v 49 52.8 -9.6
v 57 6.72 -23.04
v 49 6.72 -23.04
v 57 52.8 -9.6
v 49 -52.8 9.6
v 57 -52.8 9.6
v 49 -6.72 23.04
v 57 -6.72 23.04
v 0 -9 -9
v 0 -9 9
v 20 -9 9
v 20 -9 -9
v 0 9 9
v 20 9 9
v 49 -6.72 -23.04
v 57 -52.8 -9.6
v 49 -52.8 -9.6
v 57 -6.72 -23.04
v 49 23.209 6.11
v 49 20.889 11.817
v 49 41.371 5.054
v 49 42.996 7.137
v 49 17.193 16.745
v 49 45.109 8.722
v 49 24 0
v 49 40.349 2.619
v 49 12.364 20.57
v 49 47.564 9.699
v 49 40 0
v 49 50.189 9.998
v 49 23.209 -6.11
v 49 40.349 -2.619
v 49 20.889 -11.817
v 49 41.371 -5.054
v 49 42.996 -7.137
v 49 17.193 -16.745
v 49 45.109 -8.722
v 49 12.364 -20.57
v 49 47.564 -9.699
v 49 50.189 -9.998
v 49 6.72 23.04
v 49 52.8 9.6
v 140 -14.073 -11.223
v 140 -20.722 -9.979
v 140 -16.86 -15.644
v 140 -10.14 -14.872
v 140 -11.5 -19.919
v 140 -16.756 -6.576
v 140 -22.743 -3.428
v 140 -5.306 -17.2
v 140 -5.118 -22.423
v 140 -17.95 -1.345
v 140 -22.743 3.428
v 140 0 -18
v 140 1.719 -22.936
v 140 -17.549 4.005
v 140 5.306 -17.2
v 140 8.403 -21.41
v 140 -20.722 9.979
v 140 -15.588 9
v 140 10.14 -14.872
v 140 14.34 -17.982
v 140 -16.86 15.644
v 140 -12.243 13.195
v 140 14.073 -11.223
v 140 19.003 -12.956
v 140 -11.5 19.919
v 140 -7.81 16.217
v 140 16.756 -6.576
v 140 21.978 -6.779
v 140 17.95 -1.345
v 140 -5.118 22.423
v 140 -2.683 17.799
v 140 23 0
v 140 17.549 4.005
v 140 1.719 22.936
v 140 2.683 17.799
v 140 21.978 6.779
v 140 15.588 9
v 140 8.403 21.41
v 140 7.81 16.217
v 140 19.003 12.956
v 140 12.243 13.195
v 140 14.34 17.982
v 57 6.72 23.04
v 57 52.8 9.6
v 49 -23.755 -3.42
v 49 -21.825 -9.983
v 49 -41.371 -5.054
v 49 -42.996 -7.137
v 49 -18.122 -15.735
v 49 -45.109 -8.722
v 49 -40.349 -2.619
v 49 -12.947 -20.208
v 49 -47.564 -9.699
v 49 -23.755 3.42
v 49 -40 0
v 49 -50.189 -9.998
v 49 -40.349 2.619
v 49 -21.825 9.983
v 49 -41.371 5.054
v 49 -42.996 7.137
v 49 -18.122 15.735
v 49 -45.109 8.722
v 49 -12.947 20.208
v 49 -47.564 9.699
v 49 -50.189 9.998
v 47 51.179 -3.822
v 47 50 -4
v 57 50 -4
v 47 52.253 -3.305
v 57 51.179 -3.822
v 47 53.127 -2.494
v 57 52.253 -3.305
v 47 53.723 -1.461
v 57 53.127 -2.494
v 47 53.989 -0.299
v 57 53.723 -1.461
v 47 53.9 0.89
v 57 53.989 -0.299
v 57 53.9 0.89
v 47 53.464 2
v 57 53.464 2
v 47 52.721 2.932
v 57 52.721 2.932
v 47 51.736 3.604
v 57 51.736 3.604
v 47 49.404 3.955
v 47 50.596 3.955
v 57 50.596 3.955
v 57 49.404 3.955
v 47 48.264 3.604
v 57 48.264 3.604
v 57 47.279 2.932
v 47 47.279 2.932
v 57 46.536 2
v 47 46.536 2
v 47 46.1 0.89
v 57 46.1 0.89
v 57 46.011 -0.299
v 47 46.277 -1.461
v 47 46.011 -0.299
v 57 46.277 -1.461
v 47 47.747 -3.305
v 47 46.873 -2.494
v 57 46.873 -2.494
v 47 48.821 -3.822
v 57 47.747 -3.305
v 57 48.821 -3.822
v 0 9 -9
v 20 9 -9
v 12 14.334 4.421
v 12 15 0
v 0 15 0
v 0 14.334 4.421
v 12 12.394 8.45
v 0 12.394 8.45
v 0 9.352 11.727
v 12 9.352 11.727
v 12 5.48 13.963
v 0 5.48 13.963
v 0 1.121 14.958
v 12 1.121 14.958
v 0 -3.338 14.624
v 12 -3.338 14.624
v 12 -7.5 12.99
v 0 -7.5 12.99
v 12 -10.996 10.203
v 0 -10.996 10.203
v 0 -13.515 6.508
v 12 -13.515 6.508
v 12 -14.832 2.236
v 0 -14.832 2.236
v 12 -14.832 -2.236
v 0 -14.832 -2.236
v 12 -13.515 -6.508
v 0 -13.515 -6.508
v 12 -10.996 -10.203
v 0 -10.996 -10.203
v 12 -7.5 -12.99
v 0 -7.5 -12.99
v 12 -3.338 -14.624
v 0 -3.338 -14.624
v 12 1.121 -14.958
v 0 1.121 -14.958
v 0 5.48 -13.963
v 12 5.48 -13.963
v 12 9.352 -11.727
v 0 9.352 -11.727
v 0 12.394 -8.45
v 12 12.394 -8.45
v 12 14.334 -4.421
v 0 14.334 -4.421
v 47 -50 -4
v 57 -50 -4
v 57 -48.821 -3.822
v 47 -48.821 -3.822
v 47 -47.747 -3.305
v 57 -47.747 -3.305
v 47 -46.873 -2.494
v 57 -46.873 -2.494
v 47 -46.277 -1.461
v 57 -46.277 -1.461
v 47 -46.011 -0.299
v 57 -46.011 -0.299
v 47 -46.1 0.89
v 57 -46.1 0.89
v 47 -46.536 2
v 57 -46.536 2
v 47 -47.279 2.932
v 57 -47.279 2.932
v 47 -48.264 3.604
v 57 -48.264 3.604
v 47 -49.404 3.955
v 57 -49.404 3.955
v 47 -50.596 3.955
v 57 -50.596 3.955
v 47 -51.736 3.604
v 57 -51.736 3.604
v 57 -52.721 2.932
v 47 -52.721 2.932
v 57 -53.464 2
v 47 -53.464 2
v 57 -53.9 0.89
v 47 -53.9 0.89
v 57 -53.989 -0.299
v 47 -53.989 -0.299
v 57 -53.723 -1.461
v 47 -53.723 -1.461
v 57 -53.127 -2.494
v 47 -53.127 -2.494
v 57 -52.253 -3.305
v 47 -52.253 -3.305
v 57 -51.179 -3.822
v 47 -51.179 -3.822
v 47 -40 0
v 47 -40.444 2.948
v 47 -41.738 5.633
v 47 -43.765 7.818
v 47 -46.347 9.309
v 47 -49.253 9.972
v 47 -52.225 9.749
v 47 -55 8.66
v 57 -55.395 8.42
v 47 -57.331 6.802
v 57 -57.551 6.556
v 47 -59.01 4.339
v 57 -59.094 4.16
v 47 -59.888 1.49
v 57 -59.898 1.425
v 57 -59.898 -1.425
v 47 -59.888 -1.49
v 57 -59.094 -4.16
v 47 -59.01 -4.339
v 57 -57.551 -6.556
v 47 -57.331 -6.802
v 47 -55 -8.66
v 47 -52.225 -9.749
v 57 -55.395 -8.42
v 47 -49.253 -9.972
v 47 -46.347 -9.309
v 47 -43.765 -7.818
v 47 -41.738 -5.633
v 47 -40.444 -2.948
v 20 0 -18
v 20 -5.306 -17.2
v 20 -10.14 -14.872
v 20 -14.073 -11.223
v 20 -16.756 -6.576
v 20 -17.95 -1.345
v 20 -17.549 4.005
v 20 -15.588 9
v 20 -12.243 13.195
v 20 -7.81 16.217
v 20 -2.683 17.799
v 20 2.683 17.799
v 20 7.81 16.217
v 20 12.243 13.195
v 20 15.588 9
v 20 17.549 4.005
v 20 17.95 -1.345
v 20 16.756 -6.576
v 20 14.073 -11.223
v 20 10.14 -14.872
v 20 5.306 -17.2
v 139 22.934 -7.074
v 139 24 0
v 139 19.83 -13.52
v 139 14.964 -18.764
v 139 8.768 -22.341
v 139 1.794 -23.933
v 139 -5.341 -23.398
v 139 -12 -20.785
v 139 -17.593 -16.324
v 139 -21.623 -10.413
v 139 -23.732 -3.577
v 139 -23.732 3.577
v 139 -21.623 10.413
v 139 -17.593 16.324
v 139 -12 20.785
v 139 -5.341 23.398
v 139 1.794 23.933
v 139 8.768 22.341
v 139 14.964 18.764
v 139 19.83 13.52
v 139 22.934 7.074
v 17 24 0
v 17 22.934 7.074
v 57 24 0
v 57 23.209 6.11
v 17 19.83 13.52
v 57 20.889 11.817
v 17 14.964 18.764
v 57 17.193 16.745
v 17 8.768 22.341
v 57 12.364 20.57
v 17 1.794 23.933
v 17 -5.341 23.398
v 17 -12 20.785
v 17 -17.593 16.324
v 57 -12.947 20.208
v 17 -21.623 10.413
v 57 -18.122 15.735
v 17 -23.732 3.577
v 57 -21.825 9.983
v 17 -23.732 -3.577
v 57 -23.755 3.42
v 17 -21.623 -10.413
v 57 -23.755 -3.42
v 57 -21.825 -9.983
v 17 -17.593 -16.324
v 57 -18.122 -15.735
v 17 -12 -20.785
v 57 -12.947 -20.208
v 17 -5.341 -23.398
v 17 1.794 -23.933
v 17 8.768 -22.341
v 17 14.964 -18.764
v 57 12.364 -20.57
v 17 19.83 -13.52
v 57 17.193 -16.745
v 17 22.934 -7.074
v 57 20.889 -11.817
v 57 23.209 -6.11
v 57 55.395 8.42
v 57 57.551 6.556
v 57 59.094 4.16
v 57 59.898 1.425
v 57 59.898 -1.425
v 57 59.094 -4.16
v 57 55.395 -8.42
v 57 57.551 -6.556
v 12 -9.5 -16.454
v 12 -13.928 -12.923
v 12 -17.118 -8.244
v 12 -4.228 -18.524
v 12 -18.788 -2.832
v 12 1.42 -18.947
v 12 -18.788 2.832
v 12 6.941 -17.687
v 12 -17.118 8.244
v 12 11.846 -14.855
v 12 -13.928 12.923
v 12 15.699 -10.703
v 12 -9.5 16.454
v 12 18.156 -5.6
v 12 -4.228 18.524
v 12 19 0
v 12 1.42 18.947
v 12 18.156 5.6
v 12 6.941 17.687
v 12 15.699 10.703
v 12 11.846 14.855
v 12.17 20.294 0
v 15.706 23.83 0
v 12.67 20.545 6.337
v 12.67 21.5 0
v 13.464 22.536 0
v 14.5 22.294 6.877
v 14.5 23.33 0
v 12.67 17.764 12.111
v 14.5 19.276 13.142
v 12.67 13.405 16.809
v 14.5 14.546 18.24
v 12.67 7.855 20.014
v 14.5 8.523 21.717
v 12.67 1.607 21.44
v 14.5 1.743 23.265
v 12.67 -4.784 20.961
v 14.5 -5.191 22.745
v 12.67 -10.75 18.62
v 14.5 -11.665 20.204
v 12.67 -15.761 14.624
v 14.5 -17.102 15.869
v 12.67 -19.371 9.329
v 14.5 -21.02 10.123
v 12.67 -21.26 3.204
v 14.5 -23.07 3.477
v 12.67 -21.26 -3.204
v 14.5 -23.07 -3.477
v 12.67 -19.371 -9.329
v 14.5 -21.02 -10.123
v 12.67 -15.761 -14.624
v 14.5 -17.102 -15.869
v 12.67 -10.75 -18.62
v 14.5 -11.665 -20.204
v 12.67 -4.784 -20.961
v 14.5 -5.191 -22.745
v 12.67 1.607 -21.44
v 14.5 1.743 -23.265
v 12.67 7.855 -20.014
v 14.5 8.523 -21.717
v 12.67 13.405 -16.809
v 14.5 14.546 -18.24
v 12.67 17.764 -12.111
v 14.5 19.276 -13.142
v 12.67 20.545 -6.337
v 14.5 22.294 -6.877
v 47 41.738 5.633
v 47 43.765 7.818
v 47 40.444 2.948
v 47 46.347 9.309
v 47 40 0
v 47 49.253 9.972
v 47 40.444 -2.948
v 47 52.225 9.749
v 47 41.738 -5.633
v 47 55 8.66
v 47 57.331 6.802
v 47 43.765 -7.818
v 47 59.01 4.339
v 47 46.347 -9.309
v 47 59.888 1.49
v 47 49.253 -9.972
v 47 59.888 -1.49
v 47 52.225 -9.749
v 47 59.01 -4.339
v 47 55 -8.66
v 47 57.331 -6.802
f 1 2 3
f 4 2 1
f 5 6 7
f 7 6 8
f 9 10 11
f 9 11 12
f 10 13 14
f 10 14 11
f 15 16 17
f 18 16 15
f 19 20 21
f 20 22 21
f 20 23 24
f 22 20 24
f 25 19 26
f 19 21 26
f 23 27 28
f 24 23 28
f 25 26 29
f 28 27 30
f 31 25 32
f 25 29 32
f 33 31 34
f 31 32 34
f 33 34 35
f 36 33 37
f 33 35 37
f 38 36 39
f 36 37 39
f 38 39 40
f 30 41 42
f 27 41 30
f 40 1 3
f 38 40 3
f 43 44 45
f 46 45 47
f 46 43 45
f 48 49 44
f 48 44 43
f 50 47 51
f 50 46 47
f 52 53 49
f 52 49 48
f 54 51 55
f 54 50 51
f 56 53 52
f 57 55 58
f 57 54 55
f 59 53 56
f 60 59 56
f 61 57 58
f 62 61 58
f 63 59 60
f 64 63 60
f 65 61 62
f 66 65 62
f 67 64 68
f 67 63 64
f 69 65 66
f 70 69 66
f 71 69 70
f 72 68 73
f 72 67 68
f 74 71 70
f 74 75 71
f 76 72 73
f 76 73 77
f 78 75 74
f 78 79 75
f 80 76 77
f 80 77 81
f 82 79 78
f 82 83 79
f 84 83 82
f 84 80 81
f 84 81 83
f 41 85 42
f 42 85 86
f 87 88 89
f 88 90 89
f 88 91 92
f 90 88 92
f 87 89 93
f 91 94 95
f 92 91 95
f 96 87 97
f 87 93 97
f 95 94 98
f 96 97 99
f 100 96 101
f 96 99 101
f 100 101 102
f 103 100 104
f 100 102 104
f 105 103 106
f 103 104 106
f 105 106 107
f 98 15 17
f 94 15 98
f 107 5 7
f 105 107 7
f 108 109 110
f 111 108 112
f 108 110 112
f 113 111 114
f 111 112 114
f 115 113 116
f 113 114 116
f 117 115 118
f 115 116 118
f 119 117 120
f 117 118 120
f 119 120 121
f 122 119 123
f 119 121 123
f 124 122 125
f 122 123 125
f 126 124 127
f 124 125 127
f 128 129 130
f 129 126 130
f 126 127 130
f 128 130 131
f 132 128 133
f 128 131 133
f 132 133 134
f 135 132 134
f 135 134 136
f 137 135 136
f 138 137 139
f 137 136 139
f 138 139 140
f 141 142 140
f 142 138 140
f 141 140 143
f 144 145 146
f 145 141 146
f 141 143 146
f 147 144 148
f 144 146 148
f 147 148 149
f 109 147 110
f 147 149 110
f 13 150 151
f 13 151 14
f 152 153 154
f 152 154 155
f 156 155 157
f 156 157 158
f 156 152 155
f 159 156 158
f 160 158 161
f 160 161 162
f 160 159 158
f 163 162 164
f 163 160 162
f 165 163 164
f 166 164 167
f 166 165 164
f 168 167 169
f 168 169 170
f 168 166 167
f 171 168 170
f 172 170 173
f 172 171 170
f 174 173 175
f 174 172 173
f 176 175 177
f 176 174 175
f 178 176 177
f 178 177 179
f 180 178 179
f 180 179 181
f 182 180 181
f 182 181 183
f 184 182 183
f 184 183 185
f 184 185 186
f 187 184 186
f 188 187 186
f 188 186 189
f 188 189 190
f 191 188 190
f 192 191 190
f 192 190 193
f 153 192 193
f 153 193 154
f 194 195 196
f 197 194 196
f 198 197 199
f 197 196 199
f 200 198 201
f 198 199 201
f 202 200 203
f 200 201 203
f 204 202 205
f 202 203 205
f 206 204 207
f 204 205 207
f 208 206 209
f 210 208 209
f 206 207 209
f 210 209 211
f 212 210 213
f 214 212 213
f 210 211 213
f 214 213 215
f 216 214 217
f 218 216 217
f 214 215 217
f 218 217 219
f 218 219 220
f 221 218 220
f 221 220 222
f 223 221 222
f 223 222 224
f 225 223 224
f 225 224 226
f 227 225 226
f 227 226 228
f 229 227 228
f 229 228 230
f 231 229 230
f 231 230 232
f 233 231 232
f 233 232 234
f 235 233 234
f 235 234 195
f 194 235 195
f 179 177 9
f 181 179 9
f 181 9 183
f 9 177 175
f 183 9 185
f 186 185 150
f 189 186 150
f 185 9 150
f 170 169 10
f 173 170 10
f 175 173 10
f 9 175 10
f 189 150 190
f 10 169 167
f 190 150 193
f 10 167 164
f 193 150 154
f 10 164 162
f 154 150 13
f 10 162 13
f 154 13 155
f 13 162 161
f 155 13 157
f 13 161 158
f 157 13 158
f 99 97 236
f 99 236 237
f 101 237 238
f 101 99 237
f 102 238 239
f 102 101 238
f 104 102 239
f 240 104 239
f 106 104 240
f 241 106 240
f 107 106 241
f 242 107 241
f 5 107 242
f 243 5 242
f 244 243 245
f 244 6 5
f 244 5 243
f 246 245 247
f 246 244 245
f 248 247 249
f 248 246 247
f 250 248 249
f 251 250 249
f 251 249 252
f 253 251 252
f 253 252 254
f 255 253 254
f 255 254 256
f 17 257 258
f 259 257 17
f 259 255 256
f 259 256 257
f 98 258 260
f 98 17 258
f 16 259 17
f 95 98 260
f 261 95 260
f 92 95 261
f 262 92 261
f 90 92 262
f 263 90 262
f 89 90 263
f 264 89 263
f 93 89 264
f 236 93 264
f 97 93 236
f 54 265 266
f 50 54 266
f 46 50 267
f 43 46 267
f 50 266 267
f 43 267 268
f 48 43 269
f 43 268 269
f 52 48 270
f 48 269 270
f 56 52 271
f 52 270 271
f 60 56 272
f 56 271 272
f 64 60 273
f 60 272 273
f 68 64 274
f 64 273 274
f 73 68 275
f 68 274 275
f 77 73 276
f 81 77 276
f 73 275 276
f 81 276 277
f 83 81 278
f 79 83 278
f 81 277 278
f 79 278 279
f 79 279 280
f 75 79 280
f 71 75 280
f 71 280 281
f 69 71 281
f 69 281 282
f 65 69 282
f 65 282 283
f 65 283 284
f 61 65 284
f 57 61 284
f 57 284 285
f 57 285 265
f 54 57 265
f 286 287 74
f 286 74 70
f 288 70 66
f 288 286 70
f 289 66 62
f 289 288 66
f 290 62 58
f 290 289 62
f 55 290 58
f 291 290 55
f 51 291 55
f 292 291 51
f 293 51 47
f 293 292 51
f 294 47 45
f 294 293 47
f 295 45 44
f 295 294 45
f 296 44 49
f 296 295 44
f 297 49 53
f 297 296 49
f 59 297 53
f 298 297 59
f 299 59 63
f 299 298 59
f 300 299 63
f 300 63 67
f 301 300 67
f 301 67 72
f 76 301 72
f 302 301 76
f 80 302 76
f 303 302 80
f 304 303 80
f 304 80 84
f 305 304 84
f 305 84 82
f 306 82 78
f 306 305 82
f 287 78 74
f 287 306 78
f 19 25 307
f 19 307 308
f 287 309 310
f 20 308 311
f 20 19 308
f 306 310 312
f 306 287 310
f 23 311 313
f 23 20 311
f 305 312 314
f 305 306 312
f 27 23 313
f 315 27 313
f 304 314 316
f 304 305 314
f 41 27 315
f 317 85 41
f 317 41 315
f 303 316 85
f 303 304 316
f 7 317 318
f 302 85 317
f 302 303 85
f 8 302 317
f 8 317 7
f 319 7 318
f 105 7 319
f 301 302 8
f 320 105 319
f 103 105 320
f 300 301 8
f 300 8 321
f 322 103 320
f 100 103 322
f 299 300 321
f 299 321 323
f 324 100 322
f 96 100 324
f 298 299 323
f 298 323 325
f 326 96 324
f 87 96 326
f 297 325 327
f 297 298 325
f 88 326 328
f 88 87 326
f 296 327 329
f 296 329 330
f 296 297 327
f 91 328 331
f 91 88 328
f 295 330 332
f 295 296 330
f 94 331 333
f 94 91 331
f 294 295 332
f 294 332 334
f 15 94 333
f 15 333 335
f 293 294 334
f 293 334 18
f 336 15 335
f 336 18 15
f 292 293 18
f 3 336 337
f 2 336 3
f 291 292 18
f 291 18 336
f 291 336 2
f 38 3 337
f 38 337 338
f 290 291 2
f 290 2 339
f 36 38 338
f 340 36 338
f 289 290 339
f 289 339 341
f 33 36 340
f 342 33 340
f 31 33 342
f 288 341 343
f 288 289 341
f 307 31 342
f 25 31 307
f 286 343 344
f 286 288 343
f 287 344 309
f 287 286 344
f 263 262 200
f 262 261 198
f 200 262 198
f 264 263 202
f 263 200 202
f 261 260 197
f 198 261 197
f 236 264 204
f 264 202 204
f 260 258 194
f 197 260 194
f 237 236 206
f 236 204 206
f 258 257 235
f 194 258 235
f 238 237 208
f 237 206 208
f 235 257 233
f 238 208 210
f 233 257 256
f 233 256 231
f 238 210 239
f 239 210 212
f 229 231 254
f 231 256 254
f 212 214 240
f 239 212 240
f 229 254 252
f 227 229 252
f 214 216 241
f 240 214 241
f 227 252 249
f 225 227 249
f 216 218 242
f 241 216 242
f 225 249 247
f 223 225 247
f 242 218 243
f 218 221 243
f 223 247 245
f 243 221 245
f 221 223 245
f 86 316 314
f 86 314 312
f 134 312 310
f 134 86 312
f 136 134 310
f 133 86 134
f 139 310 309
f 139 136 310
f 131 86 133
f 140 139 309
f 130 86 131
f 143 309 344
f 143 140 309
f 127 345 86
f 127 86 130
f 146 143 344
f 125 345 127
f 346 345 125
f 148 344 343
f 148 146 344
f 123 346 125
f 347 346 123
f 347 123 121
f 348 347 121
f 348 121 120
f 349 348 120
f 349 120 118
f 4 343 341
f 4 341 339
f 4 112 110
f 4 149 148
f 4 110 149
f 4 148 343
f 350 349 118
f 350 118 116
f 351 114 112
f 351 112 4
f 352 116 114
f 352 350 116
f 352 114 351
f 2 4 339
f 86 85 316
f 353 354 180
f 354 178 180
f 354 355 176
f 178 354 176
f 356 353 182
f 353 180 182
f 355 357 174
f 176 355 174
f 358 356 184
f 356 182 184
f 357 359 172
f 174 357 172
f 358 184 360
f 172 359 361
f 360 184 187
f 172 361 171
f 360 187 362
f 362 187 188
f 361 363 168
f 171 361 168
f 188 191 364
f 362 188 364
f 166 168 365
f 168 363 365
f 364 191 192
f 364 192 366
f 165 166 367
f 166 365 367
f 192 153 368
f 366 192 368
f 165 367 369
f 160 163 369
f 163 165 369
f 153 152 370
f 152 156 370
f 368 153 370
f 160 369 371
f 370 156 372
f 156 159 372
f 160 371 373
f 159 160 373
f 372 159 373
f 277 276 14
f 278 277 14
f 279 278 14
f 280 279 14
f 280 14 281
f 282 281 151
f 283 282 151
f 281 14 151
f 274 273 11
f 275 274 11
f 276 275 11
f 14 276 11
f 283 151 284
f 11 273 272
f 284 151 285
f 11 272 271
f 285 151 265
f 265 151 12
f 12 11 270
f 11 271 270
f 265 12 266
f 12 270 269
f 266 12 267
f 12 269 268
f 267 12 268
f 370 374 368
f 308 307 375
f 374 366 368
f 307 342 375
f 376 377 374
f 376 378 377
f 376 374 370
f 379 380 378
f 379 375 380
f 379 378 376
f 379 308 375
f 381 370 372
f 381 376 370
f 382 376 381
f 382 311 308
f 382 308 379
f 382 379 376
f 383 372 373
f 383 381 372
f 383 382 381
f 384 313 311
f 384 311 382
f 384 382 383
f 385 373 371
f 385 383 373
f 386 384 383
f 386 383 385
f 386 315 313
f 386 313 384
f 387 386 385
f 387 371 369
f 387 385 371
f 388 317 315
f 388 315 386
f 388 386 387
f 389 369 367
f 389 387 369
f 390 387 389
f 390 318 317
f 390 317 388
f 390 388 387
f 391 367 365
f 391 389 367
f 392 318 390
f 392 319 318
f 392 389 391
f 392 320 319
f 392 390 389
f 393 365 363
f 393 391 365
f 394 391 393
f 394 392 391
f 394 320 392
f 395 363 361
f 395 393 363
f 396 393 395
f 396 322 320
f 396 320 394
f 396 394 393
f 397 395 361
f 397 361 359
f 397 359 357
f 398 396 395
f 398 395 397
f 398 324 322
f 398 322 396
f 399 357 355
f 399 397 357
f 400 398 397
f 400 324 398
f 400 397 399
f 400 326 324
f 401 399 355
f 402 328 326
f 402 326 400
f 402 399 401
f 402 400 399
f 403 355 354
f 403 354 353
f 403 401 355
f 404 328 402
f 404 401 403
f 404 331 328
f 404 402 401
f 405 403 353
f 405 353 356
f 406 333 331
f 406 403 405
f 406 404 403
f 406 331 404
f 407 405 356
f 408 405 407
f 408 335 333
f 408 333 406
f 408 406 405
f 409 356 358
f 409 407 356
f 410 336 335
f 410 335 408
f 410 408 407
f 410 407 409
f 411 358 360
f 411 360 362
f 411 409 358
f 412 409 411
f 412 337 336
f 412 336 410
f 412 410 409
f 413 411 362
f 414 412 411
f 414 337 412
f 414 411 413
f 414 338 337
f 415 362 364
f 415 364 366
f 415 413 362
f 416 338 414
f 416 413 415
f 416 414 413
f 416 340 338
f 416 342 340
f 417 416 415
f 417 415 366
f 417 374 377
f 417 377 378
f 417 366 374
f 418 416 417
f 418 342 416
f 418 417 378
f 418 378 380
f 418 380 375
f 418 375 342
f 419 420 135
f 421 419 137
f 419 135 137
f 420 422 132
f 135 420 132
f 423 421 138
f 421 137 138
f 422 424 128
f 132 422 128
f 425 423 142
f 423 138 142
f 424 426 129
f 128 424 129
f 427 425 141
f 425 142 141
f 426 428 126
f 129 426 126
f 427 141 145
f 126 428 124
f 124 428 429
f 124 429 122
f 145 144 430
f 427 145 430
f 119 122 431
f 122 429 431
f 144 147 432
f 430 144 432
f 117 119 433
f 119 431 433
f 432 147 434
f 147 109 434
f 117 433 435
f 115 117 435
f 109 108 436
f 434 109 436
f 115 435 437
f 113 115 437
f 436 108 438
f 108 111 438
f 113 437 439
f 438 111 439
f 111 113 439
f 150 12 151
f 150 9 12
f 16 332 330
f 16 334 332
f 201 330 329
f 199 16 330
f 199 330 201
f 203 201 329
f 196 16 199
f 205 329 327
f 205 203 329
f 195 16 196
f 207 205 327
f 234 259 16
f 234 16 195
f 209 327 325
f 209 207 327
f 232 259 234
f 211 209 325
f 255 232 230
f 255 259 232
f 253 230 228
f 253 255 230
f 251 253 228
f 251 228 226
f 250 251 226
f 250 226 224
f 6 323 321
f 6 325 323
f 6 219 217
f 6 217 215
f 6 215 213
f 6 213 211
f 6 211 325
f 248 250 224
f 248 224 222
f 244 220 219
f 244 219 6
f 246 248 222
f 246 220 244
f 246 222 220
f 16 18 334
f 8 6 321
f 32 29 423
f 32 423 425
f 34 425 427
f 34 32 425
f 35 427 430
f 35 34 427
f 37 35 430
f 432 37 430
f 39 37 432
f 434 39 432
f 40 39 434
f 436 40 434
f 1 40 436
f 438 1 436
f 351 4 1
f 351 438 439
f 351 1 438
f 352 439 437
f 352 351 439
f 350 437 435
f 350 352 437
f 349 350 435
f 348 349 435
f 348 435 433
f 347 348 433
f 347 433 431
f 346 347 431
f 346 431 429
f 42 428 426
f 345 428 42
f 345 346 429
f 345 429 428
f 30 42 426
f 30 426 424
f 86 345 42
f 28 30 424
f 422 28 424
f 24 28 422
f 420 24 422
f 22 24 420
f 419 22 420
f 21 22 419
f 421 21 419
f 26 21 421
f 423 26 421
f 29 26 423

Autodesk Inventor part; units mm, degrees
ref_plane "YZ Plane" through (0, 0, 0) normal (1, 0, 0) x (0, 1, 0)
ref_plane "XZ Plane" through (0, 0, 0) normal (0, 1, 0) x (-1, 0, 0)
sketch "Эскиз1" plane through (0, 0, 0) normal (0, 0, 1) x (1, 0, 0)
  line L0 (0, 0) -> (140, 0)
  line L1 (0, 0) -> (0, 15)
  line L2 (0, 15) -> (12, 15)
  line L3 (12, 15) -> (12, 24)
  line L4 (12, 24) -> (140, 24)
  line L5 (140, 24) -> (140, 0)
  dimension "d1" = 30
  dimension "d2" = 48
  dimension "d3" = 12
  dimension "d4" = 140
revolve "Вращение1" add sketch "Эскиз1" angle 360 about axis through (0, 0, 0) along (1, 0, 0)
ref_plane "РабПлоскость1" through (57, 0, 0) normal (1, 0, 0) x (0, 0, -1)
sketch "Эскиз2" plane through (57, 0, 0) normal (1, 0, 0) x (0, 0, -1)
  arc A0 (0, 40) -> (9.6, 52.8) centre (0, 50) ccw
  circle A1 centre (0, 0) radius 24 projected
  line L0 (-23.04, 6.72) -> (-9.6, 52.8)
  line L1 (0, -43.1124) -> (0, 90.6743) projected
  line L2 (23.04, 6.72) -> (9.6, 52.8)
  circle A2 centre (0, 50) radius 4
  arc A3 (23.04, 6.72) -> (-23.04, 6.72) centre (0, 0) ccw
  arc A4 (-9.6, 52.8) -> (0, 40) centre (0, 50) ccw
  arc A5 (9.6, 52.8) -> (-9.6, 52.8) centre (0, 50) ccw
  point P0 (0, 0)
  dimension "d7" = 20
  dimension "d8" = 8
  dimension "d13" = 50
extrude "Выдавливание1" add sketch "Эскиз2" against normal blind 8 contours L1 A2 A5 A0 | A0 L2 A1 L1 | A4 A5 L1 A2 | L1 A1 L0 A4
extrude "Выдавливание2" add sketch "Эскиз2" against normal blind 10 contours L1 A2 A5 A0 | A4 A5 L1 A2
mirror "Зеркальное отражение1" about plane through (0, 0, 0) normal (0, 1, 0) of "Выдавливание1", "Выдавливание2"
sketch "Эскиз3" plane through (140, 0, 0) normal (1, 0, 0) x (0, 0, -1)
  circle A0 centre (0, 0) radius 24 projected
hole "Отверстие1" at (140, 0, 0) direction (-1, 0, 0) diameter 36 depth 120
sketch "Эскиз4" plane through (0, 0, 0) normal (-1, 0, 0) x (0, 0, 1)
  line L0 (9, 9) -> (9, -9)
  line L1 (9, -9) -> (-9, -9)
  line L2 (-9, -9) -> (-9, 9)
  line L3 (-9, 9) -> (9, 9)
  point P0 (0, 0)
  point P1 (0, 0)
  dimension "d21" = 18
extrude "Выдавливание3" cut sketch "Эскиз4" against normal up to surface (20 mm away)
thread "Резьба1" size "M48x1.5" class "6g" standard "ISO Metric profile" length 64
fillet "Сопряжение1" radius 5 1 edges at (12, -24, 0)
chamfer "Фаска1" distance 1 angle 45 1 edges at (140, -24, 0)
properties part number "05.01.003" material "Чугун, серый"
